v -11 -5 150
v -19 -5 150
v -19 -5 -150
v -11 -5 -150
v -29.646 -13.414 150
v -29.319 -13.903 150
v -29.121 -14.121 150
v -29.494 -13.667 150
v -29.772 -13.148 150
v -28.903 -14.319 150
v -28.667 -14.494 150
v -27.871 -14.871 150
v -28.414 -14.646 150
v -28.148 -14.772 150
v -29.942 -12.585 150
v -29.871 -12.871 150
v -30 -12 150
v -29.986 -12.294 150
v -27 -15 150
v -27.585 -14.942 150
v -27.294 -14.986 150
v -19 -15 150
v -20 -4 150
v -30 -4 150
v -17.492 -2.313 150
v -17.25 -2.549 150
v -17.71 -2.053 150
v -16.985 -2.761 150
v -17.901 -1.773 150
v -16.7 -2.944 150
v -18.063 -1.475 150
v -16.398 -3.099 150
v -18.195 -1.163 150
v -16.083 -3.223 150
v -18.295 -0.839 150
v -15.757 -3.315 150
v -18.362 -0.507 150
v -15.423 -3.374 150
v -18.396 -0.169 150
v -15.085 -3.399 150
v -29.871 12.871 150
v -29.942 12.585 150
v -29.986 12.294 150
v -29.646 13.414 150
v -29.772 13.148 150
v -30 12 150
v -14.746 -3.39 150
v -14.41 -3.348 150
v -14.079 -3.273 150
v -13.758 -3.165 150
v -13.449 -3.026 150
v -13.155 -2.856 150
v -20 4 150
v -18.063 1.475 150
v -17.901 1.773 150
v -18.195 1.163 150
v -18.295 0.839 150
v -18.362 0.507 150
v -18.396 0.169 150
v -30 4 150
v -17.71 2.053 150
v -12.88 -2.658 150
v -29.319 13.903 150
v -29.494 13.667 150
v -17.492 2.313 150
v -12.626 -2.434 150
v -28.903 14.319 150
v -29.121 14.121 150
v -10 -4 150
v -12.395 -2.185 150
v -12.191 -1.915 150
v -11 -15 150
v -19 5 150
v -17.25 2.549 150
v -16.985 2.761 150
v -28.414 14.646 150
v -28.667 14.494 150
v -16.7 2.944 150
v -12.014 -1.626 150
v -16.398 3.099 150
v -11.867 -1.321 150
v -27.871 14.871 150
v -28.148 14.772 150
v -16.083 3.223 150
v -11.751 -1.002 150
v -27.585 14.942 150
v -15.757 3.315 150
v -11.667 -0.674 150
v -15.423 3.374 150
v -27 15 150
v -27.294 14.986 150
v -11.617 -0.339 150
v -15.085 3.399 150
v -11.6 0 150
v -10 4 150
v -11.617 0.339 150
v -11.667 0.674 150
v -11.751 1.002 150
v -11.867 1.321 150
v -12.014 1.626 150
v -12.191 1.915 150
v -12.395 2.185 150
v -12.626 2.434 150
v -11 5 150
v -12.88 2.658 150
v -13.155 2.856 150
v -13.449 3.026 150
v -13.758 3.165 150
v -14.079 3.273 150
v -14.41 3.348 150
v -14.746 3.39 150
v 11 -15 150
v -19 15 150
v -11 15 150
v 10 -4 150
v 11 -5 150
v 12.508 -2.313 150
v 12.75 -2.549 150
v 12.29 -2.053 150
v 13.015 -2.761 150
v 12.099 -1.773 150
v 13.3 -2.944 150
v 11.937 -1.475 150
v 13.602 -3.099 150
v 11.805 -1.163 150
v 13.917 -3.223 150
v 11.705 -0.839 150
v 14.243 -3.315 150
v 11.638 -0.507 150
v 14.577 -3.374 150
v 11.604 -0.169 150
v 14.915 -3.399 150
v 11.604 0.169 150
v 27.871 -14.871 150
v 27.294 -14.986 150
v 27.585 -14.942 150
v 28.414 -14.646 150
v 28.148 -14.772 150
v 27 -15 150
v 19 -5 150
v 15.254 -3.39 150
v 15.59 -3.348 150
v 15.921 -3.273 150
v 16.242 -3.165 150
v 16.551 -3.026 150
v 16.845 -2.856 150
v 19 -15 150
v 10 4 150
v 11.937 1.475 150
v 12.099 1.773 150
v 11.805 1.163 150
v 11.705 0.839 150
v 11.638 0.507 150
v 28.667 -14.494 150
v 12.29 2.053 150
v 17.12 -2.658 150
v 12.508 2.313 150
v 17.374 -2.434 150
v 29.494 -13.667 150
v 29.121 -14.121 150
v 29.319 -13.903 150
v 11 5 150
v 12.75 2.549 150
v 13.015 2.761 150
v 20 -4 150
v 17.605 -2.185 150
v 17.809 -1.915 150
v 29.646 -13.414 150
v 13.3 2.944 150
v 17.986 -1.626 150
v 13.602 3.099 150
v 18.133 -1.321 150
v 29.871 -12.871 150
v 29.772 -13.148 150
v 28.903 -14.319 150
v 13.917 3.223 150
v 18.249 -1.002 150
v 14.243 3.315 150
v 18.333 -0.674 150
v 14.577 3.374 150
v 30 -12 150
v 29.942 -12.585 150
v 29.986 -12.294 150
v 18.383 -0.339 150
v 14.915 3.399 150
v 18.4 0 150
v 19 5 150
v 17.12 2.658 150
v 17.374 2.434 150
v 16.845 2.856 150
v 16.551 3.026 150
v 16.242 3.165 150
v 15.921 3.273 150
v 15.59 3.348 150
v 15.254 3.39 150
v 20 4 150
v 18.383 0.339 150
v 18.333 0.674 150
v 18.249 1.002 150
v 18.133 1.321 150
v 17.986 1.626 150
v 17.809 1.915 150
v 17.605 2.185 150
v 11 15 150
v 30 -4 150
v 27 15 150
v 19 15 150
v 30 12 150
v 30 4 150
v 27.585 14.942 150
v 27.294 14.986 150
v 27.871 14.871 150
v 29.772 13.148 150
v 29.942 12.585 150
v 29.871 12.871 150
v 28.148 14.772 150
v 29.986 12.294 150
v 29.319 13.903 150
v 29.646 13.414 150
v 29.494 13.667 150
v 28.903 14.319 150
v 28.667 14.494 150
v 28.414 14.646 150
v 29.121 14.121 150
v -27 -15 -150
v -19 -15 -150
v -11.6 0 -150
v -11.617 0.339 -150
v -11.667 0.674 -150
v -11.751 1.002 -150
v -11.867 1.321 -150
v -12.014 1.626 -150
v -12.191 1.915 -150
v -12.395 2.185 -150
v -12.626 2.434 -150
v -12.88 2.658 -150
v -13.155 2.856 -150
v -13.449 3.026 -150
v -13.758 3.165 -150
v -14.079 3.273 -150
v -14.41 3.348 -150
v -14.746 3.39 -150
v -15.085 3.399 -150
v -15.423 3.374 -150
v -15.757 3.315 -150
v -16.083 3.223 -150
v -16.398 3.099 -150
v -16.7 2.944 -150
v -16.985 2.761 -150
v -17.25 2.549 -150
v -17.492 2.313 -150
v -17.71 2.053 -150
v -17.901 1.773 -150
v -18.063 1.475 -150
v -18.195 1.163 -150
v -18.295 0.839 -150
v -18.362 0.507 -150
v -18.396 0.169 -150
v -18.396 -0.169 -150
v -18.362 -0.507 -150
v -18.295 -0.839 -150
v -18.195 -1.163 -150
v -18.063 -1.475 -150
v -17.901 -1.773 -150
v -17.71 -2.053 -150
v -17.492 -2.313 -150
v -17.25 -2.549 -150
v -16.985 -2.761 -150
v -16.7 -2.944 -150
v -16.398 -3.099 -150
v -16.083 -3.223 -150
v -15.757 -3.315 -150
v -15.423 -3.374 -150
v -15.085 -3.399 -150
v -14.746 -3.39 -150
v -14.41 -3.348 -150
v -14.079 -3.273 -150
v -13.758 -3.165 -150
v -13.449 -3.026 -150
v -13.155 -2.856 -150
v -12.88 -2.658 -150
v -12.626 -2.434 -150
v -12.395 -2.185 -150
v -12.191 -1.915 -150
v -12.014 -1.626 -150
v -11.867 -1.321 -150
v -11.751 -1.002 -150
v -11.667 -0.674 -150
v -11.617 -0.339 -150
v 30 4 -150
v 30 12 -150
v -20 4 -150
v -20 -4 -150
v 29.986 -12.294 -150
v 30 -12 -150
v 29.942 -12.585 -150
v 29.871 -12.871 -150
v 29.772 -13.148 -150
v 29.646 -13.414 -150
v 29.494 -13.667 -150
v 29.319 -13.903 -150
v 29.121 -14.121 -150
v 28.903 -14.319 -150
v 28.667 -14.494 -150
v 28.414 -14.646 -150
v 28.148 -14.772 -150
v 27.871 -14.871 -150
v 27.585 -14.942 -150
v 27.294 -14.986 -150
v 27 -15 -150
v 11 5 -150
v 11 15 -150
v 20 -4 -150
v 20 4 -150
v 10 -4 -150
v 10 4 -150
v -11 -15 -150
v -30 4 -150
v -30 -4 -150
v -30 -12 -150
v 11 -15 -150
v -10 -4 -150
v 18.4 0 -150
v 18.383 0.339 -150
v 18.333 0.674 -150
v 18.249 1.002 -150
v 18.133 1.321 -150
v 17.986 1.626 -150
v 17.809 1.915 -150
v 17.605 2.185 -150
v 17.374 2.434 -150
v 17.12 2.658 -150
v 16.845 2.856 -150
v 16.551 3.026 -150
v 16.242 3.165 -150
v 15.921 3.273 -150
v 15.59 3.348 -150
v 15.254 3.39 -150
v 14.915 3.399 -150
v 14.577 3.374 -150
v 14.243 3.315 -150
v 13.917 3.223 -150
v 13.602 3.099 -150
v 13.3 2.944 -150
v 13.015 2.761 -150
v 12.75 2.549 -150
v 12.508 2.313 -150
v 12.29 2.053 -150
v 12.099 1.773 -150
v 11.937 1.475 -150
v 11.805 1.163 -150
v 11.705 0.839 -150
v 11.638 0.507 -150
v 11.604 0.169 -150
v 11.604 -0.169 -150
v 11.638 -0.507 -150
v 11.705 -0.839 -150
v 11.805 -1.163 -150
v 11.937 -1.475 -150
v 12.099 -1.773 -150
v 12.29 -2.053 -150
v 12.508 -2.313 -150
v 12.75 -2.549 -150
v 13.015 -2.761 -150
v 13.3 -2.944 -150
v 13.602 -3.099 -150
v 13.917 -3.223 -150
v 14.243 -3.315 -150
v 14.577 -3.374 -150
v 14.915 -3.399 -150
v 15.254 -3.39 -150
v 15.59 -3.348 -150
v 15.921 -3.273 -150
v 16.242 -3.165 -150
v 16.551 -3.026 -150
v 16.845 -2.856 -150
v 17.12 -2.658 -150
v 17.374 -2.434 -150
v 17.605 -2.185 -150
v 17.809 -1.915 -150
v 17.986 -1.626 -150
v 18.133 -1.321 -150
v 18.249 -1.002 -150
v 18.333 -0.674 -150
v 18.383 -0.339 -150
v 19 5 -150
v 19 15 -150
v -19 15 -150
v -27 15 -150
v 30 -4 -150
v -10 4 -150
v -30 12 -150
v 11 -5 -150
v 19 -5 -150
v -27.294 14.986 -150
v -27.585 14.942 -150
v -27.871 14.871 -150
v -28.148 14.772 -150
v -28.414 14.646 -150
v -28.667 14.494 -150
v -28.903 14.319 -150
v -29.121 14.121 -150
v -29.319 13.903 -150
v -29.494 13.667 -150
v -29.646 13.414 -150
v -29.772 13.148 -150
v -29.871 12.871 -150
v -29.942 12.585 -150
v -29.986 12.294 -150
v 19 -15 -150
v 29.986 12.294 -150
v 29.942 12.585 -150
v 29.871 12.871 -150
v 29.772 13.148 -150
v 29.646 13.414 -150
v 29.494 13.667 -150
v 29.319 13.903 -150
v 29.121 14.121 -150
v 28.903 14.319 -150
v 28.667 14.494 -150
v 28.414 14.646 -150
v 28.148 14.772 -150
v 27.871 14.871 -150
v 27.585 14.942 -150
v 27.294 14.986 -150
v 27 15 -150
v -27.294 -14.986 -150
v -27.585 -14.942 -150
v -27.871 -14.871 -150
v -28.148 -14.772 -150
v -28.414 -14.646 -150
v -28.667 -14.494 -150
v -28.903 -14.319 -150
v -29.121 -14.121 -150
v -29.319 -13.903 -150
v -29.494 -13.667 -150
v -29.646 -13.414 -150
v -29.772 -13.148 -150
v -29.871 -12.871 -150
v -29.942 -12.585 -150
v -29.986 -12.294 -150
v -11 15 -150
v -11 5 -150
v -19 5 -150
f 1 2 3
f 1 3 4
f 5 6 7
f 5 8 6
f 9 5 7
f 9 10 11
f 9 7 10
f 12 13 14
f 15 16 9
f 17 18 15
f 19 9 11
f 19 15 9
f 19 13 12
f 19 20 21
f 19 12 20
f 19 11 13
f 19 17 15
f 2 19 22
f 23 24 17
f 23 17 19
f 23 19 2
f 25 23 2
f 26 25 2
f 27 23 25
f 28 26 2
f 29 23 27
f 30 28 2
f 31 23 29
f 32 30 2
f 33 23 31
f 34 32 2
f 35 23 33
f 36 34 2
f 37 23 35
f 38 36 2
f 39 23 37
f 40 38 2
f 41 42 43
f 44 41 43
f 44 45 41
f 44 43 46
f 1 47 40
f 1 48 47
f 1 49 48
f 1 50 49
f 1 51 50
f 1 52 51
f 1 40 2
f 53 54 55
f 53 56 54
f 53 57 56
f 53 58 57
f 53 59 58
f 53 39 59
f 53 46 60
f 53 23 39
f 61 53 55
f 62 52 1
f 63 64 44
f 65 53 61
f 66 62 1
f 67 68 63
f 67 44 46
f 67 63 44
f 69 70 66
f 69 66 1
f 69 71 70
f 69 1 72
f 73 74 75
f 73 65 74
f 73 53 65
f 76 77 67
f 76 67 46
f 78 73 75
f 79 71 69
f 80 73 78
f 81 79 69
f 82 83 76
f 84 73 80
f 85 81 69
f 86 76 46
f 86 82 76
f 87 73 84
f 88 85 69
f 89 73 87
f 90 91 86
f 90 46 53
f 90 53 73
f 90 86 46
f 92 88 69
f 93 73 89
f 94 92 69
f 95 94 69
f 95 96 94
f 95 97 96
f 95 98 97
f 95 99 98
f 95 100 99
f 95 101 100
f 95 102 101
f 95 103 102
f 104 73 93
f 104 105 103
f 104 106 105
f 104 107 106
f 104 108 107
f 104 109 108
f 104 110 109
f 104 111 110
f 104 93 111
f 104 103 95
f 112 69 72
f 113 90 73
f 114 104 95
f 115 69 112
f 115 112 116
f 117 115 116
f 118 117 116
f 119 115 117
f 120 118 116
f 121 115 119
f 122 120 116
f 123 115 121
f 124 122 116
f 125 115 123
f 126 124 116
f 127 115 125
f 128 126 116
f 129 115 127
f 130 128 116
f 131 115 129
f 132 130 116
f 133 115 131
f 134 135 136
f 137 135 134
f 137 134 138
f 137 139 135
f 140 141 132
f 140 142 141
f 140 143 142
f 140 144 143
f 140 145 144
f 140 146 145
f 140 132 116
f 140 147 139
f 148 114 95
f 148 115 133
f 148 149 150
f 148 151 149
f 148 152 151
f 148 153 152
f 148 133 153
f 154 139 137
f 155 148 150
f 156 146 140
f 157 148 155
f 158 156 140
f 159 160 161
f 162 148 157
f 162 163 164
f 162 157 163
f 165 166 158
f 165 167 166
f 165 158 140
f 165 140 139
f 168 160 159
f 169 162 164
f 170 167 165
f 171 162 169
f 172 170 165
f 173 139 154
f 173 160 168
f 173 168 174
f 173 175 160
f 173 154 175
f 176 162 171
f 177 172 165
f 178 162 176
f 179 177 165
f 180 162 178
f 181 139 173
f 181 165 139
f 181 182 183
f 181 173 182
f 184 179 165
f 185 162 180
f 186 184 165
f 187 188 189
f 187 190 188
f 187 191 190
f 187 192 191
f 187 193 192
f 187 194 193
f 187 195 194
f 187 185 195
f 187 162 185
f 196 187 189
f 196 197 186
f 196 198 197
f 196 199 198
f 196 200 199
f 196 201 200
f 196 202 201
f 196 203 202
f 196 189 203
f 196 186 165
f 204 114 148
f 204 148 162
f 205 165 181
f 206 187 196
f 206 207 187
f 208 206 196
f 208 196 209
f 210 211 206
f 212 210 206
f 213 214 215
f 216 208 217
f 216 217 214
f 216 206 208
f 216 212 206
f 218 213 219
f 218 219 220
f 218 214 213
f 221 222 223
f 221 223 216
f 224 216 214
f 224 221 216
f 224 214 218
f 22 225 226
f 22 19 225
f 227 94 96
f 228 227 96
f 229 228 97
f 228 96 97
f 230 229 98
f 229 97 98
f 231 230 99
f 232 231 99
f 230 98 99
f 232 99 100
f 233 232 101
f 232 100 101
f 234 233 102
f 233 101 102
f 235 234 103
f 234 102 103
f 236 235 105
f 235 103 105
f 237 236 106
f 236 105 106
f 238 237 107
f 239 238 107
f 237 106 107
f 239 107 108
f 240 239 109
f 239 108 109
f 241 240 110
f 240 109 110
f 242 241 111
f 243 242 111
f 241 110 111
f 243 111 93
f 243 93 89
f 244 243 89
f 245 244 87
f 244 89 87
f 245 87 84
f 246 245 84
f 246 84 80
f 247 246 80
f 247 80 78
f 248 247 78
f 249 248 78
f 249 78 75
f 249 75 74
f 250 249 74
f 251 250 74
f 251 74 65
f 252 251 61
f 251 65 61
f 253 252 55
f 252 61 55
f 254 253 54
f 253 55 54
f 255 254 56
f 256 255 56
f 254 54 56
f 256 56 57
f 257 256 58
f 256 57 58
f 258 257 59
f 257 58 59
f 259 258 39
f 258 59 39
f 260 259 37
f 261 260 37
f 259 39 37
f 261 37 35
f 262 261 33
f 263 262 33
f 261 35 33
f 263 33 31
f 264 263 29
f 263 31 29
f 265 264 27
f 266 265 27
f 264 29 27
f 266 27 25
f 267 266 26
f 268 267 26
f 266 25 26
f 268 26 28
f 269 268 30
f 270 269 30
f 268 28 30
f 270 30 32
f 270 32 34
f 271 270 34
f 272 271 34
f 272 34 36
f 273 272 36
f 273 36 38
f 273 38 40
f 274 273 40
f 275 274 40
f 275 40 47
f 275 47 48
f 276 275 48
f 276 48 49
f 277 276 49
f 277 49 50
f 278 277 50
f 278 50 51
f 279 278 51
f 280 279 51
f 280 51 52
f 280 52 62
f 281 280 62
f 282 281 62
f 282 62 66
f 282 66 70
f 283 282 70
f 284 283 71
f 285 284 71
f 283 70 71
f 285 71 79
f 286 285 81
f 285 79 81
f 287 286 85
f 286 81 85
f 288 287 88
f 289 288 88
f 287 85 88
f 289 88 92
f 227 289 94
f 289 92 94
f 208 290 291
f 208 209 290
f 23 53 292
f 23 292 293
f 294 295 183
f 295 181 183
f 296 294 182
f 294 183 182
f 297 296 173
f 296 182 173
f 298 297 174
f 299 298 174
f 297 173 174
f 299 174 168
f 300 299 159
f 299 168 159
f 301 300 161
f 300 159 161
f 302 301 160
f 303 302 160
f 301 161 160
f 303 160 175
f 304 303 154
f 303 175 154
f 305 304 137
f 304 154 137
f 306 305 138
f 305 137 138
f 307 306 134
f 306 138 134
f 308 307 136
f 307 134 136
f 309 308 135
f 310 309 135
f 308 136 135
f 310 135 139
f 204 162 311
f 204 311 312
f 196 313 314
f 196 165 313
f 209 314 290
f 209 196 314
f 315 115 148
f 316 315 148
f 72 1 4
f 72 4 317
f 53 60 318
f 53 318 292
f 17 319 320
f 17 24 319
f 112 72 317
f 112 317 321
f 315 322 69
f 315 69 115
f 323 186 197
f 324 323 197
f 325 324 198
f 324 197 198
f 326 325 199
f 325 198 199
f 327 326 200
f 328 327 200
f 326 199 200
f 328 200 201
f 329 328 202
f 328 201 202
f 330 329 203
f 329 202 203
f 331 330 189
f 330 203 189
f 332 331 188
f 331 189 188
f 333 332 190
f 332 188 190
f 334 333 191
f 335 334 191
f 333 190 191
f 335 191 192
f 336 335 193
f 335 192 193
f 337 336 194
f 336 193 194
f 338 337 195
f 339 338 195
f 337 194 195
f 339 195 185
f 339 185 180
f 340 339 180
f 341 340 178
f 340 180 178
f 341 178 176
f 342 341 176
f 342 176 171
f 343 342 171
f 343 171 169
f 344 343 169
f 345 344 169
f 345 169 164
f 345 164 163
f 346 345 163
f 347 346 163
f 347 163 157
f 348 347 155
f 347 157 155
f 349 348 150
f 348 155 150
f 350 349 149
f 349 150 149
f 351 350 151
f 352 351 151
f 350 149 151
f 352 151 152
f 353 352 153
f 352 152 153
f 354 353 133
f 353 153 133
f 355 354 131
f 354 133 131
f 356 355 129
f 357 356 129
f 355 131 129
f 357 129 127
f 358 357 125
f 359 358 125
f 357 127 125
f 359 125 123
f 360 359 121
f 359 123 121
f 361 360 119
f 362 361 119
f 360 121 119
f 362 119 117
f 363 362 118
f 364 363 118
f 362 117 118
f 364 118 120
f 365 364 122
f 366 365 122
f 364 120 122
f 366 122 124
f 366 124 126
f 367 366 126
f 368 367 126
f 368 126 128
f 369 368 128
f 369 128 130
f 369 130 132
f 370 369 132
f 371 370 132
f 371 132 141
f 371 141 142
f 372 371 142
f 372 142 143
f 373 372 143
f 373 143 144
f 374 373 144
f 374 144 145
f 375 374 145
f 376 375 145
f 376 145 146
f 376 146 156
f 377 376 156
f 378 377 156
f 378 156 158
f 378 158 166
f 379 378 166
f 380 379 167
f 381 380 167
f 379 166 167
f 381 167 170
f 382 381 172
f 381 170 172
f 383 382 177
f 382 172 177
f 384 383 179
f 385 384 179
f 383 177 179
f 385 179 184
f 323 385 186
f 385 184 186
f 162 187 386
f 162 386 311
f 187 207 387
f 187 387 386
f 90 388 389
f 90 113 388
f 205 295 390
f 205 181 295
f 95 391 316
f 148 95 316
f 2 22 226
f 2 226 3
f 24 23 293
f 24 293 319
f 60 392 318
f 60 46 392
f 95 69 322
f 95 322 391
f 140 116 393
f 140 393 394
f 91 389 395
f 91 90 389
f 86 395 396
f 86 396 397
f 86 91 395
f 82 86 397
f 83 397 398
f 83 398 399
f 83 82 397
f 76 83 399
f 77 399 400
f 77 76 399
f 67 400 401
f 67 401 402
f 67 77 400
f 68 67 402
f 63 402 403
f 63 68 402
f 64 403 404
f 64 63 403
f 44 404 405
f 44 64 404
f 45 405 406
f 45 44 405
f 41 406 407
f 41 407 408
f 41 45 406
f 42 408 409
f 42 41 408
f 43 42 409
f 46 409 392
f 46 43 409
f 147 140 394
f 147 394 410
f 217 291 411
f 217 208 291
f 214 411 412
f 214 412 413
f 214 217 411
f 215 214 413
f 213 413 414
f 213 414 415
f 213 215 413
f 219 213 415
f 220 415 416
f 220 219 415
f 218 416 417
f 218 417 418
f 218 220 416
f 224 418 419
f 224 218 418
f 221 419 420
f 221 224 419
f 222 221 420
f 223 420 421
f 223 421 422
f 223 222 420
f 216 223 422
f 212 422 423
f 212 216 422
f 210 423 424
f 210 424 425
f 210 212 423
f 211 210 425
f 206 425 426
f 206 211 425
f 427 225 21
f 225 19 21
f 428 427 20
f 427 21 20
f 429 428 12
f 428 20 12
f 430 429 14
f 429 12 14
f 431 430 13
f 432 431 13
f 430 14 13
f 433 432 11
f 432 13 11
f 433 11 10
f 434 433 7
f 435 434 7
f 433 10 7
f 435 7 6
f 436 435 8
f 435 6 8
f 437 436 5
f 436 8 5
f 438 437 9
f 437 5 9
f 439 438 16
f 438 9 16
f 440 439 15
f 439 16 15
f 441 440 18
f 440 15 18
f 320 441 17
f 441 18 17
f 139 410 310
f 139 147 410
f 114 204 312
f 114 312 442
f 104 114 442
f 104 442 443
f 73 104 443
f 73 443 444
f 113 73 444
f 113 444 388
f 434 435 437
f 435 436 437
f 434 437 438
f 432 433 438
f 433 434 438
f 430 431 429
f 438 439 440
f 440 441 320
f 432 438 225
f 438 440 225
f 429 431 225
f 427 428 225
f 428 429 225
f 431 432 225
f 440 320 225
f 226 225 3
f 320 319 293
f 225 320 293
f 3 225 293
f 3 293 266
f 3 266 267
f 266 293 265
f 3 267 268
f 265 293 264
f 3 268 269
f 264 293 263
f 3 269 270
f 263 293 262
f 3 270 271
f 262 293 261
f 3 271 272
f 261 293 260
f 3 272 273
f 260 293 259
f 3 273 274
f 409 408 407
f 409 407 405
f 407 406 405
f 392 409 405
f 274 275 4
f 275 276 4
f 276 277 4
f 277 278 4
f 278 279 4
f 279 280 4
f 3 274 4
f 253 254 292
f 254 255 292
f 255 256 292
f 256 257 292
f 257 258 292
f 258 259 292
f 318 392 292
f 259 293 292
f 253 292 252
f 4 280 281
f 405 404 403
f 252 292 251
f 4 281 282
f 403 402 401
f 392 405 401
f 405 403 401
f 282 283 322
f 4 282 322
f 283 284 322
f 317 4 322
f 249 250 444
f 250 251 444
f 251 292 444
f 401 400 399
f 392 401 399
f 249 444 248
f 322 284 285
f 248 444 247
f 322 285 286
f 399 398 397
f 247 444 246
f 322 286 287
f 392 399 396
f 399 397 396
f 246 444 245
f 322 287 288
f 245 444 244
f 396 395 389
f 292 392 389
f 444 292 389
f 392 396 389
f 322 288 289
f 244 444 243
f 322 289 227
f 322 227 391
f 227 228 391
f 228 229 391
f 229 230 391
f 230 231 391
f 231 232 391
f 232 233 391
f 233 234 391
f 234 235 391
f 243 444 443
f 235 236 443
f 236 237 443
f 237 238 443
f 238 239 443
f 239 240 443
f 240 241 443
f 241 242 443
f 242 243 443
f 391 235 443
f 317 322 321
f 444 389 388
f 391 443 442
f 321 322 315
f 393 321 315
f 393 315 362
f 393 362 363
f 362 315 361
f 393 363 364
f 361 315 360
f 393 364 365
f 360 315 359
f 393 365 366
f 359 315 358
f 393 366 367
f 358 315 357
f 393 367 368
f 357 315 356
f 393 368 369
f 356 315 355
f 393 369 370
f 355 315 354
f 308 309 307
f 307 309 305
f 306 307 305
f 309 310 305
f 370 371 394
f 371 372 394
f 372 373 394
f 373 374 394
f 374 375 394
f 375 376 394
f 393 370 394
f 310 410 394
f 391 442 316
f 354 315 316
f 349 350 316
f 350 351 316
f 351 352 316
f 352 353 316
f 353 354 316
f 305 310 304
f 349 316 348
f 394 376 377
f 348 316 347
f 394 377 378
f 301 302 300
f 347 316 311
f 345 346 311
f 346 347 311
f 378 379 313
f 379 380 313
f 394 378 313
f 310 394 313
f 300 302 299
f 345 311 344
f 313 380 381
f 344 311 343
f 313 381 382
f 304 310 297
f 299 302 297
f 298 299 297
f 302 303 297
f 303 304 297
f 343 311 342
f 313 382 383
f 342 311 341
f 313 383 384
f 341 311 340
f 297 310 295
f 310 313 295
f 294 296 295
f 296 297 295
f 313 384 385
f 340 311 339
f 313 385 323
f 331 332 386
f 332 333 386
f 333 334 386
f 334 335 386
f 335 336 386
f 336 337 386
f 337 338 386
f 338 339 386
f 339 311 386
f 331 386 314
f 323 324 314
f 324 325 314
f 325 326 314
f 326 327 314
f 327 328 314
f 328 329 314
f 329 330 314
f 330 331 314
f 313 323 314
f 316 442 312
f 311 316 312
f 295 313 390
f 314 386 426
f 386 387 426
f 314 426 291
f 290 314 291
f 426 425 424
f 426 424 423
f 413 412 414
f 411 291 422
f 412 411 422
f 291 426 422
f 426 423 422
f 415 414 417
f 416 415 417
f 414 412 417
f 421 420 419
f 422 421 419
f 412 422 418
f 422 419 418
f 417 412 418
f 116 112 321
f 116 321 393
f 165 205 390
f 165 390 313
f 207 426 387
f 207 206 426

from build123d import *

# Parameters (mm, degrees)
F1_DEPTH = 150
F2_W     = 20
F2_H     = 8
F2_R     = 3.4
F3_DEPTH = 300
F4_R     = 3


with BuildPart() as f1:
    # F0 (on Top) → F1 (new body, symmetric)
    with BuildSketch(Plane.XY):
        Polygon((30, 4), (30, 15), (19, 15), (19, 5), (11, 5), (11, 15), (-11, 15), (-11, 5), (-19, 5), (-19, 15), (-30, 15), (-30, 4), (-20, 4), (-20, -4), (-30, -4), (-30, -15), (-19, -15), (-19, -5), (-11, -5), (-11, -15), (11, -15), (11, -5), (19, -5), (19, -15), (30, -15), (30, -4), (20, -4), (20, 4), align=None)
    extrude(amount=F1_DEPTH, both=True)

    # F2 (on face) → F3 (cut)
    with BuildSketch(Plane.XY.offset(150)):
        Rectangle(F2_W, F2_H)
        with Locations((-15, 0)):
            Circle(F2_R)
        with Locations((15, 0)):
            Circle(F2_R)
    extrude(amount=-F3_DEPTH, mode=Mode.SUBTRACT)

    # F4
    f4_edges = [f1.edges().sort_by_distance(p)[0] for p in [
        (30, -15, 0),
        (30, 15, 0),
        (-30, -15, 0),
        (-30, 15, 0),
    ]]
    fillet(f4_edges, radius=F4_R)


solid = f1.part
